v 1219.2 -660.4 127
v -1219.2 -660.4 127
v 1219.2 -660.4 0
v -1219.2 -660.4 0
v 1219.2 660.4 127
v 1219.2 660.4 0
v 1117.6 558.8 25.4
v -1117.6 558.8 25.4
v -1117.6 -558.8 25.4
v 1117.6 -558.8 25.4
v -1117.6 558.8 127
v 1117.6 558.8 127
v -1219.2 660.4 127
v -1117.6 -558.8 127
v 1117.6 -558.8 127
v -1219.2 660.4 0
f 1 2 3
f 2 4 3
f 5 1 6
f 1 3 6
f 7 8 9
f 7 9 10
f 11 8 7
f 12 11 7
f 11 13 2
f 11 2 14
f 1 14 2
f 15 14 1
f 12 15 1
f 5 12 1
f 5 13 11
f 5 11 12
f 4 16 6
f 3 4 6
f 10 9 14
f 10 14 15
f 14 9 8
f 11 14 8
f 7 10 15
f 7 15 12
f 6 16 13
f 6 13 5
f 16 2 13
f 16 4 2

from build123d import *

# Parameters (mm, degrees)
F0_W     = 2438.4
F0_H     = 1320.8
F0_W_2   = 2235.2
F0_H_2   = 1117.6
F1_DEPTH = 25.4
F2_W     = 2438.4
F2_H     = 1320.8
F2_W_2   = 2235.2
F2_H_2   = 1117.6
F3_DEPTH = 101.6


with BuildPart() as f1:
    # F0 (on Top) → F1 (new body)
    with BuildSketch(Plane.XY):
        Rectangle(F0_W, F0_H)
        Rectangle(F0_W_2, F0_H_2, mode=Mode.SUBTRACT)
        Rectangle(F0_W_2, F0_H_2)
    extrude(amount=F1_DEPTH)

    # F2 (on face) → F3 (join)
    with BuildSketch(Plane.XY.offset(25.4)):
        Rectangle(F2_W, F2_H)
        Rectangle(F2_W_2, F2_H_2, mode=Mode.SUBTRACT)
    extrude(amount=F3_DEPTH)


solid = f1.part
